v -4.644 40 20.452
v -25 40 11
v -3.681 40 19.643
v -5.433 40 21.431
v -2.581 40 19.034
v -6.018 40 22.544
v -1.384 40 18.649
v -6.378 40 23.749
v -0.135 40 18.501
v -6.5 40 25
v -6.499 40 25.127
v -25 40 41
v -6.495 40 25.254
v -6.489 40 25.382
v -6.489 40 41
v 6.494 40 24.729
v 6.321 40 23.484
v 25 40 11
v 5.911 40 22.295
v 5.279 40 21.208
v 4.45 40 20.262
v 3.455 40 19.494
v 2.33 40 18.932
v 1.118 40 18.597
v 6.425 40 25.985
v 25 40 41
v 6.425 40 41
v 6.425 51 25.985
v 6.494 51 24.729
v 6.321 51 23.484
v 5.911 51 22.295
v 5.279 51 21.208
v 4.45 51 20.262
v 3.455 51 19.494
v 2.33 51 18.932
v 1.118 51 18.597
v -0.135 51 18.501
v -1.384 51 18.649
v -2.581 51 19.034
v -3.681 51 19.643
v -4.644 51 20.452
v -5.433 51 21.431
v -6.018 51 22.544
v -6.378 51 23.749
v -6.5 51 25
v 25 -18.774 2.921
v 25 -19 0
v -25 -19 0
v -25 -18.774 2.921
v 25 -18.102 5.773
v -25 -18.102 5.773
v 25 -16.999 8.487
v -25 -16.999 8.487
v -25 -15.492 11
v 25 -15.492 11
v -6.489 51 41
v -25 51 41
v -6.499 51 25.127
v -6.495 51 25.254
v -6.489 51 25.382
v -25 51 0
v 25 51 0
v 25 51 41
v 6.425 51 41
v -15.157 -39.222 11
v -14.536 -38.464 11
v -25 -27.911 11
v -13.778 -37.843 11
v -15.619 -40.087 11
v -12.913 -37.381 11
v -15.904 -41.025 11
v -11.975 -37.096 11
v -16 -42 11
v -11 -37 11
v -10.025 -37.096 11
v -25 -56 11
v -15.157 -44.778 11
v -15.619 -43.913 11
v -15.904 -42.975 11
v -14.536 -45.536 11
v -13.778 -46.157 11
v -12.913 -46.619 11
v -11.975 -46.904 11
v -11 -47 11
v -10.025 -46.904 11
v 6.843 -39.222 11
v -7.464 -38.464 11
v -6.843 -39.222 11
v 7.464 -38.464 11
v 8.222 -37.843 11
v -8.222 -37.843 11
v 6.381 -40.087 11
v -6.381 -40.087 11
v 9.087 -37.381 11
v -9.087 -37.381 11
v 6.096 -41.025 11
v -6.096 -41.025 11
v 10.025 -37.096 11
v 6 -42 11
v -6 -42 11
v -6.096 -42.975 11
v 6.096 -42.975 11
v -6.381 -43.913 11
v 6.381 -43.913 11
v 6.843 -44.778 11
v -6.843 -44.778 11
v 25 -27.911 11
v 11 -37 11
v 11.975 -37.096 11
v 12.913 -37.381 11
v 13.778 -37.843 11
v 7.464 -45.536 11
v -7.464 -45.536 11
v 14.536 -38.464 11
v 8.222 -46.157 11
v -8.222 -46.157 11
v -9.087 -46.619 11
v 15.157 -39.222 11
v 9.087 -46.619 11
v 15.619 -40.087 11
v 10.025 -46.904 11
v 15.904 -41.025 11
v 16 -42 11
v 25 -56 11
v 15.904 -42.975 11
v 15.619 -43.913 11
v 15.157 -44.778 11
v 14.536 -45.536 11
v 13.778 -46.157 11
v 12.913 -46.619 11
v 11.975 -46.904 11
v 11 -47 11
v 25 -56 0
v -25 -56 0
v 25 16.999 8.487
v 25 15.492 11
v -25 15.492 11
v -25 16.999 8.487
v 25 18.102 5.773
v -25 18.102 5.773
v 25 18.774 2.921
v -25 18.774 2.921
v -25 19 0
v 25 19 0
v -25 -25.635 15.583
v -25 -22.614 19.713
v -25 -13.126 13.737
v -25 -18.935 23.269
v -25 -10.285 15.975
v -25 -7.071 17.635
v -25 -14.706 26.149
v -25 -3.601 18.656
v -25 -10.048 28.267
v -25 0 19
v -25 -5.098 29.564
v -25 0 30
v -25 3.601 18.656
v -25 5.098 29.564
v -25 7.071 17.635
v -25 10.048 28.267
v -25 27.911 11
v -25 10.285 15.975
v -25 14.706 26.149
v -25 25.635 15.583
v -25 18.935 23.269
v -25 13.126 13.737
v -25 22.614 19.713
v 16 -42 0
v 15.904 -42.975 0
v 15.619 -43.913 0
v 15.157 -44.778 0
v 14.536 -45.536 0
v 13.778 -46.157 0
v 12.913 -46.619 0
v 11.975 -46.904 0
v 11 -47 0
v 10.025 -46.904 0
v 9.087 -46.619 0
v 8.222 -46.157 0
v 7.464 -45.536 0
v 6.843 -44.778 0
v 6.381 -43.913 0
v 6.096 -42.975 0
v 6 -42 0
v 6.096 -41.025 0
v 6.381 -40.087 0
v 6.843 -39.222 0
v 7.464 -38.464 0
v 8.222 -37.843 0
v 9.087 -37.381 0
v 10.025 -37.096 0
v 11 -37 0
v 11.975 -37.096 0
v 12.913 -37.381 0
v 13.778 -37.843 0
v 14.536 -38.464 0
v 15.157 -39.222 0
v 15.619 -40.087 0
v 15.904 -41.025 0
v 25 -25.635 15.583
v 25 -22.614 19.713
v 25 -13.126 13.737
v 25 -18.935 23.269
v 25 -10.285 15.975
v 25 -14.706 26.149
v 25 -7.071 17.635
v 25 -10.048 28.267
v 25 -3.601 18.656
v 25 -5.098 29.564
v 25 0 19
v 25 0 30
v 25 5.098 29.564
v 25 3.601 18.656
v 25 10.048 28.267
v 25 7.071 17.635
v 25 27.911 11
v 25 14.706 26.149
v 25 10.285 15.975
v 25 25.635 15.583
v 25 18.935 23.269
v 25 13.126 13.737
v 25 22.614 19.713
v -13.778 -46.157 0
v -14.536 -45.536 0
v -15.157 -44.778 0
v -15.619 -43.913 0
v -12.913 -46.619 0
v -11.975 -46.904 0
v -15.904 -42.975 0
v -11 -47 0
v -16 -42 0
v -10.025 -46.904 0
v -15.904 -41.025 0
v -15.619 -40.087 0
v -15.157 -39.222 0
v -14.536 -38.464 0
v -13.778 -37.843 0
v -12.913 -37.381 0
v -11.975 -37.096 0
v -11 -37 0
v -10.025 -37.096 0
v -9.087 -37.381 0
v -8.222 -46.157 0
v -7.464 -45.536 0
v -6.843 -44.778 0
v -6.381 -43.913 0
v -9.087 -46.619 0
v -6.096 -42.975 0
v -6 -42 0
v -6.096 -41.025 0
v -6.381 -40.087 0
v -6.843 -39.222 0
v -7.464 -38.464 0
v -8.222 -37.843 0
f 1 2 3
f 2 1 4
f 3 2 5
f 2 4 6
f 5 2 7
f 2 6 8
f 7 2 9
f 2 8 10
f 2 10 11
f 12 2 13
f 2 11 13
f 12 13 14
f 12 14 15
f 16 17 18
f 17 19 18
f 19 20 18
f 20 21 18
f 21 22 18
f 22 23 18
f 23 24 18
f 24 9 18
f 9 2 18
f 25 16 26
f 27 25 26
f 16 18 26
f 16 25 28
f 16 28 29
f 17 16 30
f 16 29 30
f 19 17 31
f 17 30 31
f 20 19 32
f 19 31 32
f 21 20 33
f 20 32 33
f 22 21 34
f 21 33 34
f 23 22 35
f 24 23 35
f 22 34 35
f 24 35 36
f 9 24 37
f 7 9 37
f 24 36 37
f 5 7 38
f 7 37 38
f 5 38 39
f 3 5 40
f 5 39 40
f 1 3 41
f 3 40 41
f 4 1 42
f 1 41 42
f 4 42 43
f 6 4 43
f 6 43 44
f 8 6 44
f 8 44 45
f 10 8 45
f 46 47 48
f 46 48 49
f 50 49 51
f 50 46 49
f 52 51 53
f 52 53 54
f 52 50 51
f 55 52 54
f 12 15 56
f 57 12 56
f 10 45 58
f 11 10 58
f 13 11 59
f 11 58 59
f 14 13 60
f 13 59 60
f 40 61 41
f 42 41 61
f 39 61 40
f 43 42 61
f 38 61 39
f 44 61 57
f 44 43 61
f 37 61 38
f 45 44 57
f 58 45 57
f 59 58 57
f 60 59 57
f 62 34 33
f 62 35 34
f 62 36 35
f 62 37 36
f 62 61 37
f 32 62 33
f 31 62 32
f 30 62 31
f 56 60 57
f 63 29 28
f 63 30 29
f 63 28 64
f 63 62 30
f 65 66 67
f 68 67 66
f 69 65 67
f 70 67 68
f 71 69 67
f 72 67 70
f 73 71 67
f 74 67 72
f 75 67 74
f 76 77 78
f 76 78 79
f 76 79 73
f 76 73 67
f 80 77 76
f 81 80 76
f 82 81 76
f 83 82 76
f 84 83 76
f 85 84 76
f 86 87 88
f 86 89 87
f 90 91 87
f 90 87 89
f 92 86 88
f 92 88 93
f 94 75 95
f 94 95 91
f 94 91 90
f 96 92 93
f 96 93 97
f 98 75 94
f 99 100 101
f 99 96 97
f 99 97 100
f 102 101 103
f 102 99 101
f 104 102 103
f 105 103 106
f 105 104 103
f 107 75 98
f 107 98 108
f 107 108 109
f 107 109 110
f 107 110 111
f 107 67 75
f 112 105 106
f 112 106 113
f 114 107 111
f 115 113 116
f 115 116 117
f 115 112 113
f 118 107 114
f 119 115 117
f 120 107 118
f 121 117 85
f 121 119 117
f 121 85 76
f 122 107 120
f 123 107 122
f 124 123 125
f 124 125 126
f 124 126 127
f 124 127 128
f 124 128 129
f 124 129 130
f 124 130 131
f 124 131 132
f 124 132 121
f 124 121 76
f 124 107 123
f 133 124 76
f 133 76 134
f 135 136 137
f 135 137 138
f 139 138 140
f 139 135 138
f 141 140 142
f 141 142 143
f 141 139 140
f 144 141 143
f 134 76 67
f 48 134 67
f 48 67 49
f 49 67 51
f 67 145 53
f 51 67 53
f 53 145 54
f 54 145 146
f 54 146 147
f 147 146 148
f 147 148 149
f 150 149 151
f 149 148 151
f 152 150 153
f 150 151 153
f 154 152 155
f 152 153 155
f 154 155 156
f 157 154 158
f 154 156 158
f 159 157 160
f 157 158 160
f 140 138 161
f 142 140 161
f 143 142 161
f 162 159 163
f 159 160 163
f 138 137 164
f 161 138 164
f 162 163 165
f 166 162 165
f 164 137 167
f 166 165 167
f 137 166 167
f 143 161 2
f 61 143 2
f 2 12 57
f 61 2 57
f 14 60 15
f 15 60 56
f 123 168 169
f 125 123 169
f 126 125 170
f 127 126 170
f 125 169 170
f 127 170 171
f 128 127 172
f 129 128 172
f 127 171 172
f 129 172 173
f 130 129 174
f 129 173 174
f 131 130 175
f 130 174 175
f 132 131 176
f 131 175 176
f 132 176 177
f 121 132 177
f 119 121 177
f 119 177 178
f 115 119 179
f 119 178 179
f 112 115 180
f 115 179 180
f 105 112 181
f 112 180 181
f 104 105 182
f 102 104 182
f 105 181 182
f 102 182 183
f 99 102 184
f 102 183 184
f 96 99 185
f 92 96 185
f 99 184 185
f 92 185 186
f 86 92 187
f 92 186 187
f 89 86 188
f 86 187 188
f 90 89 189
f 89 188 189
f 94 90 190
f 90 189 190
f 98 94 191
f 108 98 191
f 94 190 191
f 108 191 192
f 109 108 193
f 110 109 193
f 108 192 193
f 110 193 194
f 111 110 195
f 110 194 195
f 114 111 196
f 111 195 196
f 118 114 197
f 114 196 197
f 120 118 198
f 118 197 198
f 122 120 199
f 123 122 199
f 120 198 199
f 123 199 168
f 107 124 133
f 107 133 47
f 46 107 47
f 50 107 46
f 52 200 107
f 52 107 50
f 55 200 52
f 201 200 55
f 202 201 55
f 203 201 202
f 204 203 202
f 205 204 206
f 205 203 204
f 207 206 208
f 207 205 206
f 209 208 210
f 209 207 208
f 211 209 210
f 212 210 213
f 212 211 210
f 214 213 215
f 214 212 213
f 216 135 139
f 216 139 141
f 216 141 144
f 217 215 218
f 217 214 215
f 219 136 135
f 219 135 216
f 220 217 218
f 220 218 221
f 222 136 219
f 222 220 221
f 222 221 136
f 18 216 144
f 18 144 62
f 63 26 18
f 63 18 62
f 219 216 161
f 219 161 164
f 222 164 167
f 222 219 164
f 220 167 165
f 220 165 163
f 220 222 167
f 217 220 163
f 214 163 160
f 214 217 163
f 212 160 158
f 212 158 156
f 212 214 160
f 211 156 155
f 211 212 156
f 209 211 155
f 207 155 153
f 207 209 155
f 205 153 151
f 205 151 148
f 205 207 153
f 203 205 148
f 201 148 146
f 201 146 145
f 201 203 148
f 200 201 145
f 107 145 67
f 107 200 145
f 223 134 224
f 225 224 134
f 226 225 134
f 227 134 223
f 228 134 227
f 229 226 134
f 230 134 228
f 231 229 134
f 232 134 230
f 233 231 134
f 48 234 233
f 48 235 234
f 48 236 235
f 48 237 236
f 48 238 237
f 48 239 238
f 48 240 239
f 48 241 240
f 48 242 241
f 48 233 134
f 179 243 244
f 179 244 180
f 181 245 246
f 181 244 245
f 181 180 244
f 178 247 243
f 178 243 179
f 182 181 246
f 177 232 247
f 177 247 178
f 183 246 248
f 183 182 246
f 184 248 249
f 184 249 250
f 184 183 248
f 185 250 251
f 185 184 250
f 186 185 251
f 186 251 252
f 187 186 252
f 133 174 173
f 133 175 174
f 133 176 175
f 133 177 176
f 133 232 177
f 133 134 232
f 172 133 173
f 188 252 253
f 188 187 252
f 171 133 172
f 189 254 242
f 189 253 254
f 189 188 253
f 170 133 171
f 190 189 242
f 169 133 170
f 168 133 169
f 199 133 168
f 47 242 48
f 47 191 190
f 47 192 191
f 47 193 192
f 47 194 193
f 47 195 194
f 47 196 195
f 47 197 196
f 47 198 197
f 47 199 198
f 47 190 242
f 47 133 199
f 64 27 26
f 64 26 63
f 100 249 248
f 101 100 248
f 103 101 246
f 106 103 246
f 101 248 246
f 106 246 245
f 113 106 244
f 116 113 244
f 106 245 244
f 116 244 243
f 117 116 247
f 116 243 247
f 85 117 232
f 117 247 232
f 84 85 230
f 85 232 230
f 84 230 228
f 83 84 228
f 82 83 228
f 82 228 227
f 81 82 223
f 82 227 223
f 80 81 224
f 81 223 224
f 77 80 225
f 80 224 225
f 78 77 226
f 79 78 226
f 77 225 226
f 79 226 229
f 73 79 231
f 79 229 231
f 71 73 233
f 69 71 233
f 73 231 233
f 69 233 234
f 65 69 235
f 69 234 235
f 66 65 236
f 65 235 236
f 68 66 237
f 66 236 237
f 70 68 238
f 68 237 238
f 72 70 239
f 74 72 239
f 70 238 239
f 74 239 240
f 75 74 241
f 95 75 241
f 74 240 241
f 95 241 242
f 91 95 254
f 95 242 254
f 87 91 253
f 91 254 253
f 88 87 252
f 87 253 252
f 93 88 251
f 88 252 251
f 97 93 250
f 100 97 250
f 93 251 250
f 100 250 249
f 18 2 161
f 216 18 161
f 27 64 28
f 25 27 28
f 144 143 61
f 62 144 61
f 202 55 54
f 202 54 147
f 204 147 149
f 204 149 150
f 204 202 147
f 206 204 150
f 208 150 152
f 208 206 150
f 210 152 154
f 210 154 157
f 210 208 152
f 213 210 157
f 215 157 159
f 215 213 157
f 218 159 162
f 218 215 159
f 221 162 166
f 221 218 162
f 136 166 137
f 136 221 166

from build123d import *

# Parameters (mm, degrees)
F0_W     = 11
F0_H     = 30
F1_DEPTH = 25
F4_DEPTH = 11
F5_R     = 5
F6_DEPTH = 11


with BuildPart() as f1:
    # F0 (on Right) → F1 (new body)
    with BuildSketch(Plane.YZ):
        with Locations((45.5, 26)):
            Rectangle(F0_W, F0_H)
        with BuildLine():
            ThreePointArc((27.910571, 11), (29.473014, 5.598342), (30, 0))
            Line((30, 0), (51, 0))
            Line((51, 0), (51, 11))
            Line((51, 11), (40, 11))
            Line((40, 11), (27.910571, 11))
        make_face()
        with BuildLine():
            ThreePointArc((-15.491933, 11), (0, 19), (15.491933, 11))
            Line((15.491933, 11), (27.910571, 11))
            ThreePointArc((27.910571, 11), (0, 30), (-27.910571, 11))
            Line((-27.910571, 11), (-15.491933, 11))
        make_face()
        with BuildLine():
            Line((-30, 0), (-19, 0))
            ThreePointArc((-19, 0), (-18.10175, 5.772922), (-15.491933, 11))
            Line((-15.491933, 11), (-27.910571, 11))
            ThreePointArc((-27.910571, 11), (-29.473014, 5.598342), (-30, 0))
        make_face()
        with BuildLine():
            ThreePointArc((15.491933, 11), (18.10175, 5.772922), (19, 0))
            Line((19, 0), (30, 0))
            ThreePointArc((30, 0), (29.473014, 5.598342), (27.910571, 11))
            Line((27.910571, 11), (15.491933, 11))
        make_face()
        with BuildLine():
            Line((-56, 0), (-30, 0))
            ThreePointArc((-30, 0), (-29.473014, 5.598342), (-27.910571, 11))
            Line((-27.910571, 11), (-56, 11))
            Line((-56, 11), (-56, 0))
        make_face()
    extrude(amount=F1_DEPTH)

    # F2: F1 across face


with BuildPart() as f1_1:
    add(f1.part)
    add(f1.part.mirror(Plane(origin=(0, 7.065058, 14.616271), x_dir=(0, 1, 0), z_dir=(-1, 0, 0))))

    # F3 (on face) → F4 (cut)
    with BuildSketch(Plane(origin=(0, 51, 0), x_dir=(-1, 0, 0), z_dir=(0, 1, 0))):
        with BuildLine():
            ThreePointArc((-6.42497, 25.984765), (-0.49381, 18.518785), (6.5, 25))
            ThreePointArc((6.5, 25), (6.497197, 25.190868), (6.488791, 25.381571))
            ThreePointArc((6.488791, 25.381571), (0.303281, 31.492921), (-6.42497, 25.984765))
        make_face()
        with BuildLine():
            ThreePointArc((-6.42497, 25.984765), (0.303281, 31.492921), (6.488791, 25.381571))
            Line((6.488791, 25.381571), (6.488791, 41))
            Line((6.488791, 41), (-6.42497, 41))
            Line((-6.42497, 41), (-6.42497, 25.984765))
        make_face()
    extrude(amount=-F4_DEPTH, mode=Mode.SUBTRACT)

    # F5 (on face) → F6 (cut)
    with BuildSketch(Plane(origin=(0, 0, 0), x_dir=(1, 0, 0), z_dir=(0, 0, -1))):
        with Locations((-11, 42)):
            Circle(F5_R)
        with Locations((11, 42)):
            Circle(F5_R)
    extrude(amount=-F6_DEPTH, mode=Mode.SUBTRACT)


solid = f1_1.part
